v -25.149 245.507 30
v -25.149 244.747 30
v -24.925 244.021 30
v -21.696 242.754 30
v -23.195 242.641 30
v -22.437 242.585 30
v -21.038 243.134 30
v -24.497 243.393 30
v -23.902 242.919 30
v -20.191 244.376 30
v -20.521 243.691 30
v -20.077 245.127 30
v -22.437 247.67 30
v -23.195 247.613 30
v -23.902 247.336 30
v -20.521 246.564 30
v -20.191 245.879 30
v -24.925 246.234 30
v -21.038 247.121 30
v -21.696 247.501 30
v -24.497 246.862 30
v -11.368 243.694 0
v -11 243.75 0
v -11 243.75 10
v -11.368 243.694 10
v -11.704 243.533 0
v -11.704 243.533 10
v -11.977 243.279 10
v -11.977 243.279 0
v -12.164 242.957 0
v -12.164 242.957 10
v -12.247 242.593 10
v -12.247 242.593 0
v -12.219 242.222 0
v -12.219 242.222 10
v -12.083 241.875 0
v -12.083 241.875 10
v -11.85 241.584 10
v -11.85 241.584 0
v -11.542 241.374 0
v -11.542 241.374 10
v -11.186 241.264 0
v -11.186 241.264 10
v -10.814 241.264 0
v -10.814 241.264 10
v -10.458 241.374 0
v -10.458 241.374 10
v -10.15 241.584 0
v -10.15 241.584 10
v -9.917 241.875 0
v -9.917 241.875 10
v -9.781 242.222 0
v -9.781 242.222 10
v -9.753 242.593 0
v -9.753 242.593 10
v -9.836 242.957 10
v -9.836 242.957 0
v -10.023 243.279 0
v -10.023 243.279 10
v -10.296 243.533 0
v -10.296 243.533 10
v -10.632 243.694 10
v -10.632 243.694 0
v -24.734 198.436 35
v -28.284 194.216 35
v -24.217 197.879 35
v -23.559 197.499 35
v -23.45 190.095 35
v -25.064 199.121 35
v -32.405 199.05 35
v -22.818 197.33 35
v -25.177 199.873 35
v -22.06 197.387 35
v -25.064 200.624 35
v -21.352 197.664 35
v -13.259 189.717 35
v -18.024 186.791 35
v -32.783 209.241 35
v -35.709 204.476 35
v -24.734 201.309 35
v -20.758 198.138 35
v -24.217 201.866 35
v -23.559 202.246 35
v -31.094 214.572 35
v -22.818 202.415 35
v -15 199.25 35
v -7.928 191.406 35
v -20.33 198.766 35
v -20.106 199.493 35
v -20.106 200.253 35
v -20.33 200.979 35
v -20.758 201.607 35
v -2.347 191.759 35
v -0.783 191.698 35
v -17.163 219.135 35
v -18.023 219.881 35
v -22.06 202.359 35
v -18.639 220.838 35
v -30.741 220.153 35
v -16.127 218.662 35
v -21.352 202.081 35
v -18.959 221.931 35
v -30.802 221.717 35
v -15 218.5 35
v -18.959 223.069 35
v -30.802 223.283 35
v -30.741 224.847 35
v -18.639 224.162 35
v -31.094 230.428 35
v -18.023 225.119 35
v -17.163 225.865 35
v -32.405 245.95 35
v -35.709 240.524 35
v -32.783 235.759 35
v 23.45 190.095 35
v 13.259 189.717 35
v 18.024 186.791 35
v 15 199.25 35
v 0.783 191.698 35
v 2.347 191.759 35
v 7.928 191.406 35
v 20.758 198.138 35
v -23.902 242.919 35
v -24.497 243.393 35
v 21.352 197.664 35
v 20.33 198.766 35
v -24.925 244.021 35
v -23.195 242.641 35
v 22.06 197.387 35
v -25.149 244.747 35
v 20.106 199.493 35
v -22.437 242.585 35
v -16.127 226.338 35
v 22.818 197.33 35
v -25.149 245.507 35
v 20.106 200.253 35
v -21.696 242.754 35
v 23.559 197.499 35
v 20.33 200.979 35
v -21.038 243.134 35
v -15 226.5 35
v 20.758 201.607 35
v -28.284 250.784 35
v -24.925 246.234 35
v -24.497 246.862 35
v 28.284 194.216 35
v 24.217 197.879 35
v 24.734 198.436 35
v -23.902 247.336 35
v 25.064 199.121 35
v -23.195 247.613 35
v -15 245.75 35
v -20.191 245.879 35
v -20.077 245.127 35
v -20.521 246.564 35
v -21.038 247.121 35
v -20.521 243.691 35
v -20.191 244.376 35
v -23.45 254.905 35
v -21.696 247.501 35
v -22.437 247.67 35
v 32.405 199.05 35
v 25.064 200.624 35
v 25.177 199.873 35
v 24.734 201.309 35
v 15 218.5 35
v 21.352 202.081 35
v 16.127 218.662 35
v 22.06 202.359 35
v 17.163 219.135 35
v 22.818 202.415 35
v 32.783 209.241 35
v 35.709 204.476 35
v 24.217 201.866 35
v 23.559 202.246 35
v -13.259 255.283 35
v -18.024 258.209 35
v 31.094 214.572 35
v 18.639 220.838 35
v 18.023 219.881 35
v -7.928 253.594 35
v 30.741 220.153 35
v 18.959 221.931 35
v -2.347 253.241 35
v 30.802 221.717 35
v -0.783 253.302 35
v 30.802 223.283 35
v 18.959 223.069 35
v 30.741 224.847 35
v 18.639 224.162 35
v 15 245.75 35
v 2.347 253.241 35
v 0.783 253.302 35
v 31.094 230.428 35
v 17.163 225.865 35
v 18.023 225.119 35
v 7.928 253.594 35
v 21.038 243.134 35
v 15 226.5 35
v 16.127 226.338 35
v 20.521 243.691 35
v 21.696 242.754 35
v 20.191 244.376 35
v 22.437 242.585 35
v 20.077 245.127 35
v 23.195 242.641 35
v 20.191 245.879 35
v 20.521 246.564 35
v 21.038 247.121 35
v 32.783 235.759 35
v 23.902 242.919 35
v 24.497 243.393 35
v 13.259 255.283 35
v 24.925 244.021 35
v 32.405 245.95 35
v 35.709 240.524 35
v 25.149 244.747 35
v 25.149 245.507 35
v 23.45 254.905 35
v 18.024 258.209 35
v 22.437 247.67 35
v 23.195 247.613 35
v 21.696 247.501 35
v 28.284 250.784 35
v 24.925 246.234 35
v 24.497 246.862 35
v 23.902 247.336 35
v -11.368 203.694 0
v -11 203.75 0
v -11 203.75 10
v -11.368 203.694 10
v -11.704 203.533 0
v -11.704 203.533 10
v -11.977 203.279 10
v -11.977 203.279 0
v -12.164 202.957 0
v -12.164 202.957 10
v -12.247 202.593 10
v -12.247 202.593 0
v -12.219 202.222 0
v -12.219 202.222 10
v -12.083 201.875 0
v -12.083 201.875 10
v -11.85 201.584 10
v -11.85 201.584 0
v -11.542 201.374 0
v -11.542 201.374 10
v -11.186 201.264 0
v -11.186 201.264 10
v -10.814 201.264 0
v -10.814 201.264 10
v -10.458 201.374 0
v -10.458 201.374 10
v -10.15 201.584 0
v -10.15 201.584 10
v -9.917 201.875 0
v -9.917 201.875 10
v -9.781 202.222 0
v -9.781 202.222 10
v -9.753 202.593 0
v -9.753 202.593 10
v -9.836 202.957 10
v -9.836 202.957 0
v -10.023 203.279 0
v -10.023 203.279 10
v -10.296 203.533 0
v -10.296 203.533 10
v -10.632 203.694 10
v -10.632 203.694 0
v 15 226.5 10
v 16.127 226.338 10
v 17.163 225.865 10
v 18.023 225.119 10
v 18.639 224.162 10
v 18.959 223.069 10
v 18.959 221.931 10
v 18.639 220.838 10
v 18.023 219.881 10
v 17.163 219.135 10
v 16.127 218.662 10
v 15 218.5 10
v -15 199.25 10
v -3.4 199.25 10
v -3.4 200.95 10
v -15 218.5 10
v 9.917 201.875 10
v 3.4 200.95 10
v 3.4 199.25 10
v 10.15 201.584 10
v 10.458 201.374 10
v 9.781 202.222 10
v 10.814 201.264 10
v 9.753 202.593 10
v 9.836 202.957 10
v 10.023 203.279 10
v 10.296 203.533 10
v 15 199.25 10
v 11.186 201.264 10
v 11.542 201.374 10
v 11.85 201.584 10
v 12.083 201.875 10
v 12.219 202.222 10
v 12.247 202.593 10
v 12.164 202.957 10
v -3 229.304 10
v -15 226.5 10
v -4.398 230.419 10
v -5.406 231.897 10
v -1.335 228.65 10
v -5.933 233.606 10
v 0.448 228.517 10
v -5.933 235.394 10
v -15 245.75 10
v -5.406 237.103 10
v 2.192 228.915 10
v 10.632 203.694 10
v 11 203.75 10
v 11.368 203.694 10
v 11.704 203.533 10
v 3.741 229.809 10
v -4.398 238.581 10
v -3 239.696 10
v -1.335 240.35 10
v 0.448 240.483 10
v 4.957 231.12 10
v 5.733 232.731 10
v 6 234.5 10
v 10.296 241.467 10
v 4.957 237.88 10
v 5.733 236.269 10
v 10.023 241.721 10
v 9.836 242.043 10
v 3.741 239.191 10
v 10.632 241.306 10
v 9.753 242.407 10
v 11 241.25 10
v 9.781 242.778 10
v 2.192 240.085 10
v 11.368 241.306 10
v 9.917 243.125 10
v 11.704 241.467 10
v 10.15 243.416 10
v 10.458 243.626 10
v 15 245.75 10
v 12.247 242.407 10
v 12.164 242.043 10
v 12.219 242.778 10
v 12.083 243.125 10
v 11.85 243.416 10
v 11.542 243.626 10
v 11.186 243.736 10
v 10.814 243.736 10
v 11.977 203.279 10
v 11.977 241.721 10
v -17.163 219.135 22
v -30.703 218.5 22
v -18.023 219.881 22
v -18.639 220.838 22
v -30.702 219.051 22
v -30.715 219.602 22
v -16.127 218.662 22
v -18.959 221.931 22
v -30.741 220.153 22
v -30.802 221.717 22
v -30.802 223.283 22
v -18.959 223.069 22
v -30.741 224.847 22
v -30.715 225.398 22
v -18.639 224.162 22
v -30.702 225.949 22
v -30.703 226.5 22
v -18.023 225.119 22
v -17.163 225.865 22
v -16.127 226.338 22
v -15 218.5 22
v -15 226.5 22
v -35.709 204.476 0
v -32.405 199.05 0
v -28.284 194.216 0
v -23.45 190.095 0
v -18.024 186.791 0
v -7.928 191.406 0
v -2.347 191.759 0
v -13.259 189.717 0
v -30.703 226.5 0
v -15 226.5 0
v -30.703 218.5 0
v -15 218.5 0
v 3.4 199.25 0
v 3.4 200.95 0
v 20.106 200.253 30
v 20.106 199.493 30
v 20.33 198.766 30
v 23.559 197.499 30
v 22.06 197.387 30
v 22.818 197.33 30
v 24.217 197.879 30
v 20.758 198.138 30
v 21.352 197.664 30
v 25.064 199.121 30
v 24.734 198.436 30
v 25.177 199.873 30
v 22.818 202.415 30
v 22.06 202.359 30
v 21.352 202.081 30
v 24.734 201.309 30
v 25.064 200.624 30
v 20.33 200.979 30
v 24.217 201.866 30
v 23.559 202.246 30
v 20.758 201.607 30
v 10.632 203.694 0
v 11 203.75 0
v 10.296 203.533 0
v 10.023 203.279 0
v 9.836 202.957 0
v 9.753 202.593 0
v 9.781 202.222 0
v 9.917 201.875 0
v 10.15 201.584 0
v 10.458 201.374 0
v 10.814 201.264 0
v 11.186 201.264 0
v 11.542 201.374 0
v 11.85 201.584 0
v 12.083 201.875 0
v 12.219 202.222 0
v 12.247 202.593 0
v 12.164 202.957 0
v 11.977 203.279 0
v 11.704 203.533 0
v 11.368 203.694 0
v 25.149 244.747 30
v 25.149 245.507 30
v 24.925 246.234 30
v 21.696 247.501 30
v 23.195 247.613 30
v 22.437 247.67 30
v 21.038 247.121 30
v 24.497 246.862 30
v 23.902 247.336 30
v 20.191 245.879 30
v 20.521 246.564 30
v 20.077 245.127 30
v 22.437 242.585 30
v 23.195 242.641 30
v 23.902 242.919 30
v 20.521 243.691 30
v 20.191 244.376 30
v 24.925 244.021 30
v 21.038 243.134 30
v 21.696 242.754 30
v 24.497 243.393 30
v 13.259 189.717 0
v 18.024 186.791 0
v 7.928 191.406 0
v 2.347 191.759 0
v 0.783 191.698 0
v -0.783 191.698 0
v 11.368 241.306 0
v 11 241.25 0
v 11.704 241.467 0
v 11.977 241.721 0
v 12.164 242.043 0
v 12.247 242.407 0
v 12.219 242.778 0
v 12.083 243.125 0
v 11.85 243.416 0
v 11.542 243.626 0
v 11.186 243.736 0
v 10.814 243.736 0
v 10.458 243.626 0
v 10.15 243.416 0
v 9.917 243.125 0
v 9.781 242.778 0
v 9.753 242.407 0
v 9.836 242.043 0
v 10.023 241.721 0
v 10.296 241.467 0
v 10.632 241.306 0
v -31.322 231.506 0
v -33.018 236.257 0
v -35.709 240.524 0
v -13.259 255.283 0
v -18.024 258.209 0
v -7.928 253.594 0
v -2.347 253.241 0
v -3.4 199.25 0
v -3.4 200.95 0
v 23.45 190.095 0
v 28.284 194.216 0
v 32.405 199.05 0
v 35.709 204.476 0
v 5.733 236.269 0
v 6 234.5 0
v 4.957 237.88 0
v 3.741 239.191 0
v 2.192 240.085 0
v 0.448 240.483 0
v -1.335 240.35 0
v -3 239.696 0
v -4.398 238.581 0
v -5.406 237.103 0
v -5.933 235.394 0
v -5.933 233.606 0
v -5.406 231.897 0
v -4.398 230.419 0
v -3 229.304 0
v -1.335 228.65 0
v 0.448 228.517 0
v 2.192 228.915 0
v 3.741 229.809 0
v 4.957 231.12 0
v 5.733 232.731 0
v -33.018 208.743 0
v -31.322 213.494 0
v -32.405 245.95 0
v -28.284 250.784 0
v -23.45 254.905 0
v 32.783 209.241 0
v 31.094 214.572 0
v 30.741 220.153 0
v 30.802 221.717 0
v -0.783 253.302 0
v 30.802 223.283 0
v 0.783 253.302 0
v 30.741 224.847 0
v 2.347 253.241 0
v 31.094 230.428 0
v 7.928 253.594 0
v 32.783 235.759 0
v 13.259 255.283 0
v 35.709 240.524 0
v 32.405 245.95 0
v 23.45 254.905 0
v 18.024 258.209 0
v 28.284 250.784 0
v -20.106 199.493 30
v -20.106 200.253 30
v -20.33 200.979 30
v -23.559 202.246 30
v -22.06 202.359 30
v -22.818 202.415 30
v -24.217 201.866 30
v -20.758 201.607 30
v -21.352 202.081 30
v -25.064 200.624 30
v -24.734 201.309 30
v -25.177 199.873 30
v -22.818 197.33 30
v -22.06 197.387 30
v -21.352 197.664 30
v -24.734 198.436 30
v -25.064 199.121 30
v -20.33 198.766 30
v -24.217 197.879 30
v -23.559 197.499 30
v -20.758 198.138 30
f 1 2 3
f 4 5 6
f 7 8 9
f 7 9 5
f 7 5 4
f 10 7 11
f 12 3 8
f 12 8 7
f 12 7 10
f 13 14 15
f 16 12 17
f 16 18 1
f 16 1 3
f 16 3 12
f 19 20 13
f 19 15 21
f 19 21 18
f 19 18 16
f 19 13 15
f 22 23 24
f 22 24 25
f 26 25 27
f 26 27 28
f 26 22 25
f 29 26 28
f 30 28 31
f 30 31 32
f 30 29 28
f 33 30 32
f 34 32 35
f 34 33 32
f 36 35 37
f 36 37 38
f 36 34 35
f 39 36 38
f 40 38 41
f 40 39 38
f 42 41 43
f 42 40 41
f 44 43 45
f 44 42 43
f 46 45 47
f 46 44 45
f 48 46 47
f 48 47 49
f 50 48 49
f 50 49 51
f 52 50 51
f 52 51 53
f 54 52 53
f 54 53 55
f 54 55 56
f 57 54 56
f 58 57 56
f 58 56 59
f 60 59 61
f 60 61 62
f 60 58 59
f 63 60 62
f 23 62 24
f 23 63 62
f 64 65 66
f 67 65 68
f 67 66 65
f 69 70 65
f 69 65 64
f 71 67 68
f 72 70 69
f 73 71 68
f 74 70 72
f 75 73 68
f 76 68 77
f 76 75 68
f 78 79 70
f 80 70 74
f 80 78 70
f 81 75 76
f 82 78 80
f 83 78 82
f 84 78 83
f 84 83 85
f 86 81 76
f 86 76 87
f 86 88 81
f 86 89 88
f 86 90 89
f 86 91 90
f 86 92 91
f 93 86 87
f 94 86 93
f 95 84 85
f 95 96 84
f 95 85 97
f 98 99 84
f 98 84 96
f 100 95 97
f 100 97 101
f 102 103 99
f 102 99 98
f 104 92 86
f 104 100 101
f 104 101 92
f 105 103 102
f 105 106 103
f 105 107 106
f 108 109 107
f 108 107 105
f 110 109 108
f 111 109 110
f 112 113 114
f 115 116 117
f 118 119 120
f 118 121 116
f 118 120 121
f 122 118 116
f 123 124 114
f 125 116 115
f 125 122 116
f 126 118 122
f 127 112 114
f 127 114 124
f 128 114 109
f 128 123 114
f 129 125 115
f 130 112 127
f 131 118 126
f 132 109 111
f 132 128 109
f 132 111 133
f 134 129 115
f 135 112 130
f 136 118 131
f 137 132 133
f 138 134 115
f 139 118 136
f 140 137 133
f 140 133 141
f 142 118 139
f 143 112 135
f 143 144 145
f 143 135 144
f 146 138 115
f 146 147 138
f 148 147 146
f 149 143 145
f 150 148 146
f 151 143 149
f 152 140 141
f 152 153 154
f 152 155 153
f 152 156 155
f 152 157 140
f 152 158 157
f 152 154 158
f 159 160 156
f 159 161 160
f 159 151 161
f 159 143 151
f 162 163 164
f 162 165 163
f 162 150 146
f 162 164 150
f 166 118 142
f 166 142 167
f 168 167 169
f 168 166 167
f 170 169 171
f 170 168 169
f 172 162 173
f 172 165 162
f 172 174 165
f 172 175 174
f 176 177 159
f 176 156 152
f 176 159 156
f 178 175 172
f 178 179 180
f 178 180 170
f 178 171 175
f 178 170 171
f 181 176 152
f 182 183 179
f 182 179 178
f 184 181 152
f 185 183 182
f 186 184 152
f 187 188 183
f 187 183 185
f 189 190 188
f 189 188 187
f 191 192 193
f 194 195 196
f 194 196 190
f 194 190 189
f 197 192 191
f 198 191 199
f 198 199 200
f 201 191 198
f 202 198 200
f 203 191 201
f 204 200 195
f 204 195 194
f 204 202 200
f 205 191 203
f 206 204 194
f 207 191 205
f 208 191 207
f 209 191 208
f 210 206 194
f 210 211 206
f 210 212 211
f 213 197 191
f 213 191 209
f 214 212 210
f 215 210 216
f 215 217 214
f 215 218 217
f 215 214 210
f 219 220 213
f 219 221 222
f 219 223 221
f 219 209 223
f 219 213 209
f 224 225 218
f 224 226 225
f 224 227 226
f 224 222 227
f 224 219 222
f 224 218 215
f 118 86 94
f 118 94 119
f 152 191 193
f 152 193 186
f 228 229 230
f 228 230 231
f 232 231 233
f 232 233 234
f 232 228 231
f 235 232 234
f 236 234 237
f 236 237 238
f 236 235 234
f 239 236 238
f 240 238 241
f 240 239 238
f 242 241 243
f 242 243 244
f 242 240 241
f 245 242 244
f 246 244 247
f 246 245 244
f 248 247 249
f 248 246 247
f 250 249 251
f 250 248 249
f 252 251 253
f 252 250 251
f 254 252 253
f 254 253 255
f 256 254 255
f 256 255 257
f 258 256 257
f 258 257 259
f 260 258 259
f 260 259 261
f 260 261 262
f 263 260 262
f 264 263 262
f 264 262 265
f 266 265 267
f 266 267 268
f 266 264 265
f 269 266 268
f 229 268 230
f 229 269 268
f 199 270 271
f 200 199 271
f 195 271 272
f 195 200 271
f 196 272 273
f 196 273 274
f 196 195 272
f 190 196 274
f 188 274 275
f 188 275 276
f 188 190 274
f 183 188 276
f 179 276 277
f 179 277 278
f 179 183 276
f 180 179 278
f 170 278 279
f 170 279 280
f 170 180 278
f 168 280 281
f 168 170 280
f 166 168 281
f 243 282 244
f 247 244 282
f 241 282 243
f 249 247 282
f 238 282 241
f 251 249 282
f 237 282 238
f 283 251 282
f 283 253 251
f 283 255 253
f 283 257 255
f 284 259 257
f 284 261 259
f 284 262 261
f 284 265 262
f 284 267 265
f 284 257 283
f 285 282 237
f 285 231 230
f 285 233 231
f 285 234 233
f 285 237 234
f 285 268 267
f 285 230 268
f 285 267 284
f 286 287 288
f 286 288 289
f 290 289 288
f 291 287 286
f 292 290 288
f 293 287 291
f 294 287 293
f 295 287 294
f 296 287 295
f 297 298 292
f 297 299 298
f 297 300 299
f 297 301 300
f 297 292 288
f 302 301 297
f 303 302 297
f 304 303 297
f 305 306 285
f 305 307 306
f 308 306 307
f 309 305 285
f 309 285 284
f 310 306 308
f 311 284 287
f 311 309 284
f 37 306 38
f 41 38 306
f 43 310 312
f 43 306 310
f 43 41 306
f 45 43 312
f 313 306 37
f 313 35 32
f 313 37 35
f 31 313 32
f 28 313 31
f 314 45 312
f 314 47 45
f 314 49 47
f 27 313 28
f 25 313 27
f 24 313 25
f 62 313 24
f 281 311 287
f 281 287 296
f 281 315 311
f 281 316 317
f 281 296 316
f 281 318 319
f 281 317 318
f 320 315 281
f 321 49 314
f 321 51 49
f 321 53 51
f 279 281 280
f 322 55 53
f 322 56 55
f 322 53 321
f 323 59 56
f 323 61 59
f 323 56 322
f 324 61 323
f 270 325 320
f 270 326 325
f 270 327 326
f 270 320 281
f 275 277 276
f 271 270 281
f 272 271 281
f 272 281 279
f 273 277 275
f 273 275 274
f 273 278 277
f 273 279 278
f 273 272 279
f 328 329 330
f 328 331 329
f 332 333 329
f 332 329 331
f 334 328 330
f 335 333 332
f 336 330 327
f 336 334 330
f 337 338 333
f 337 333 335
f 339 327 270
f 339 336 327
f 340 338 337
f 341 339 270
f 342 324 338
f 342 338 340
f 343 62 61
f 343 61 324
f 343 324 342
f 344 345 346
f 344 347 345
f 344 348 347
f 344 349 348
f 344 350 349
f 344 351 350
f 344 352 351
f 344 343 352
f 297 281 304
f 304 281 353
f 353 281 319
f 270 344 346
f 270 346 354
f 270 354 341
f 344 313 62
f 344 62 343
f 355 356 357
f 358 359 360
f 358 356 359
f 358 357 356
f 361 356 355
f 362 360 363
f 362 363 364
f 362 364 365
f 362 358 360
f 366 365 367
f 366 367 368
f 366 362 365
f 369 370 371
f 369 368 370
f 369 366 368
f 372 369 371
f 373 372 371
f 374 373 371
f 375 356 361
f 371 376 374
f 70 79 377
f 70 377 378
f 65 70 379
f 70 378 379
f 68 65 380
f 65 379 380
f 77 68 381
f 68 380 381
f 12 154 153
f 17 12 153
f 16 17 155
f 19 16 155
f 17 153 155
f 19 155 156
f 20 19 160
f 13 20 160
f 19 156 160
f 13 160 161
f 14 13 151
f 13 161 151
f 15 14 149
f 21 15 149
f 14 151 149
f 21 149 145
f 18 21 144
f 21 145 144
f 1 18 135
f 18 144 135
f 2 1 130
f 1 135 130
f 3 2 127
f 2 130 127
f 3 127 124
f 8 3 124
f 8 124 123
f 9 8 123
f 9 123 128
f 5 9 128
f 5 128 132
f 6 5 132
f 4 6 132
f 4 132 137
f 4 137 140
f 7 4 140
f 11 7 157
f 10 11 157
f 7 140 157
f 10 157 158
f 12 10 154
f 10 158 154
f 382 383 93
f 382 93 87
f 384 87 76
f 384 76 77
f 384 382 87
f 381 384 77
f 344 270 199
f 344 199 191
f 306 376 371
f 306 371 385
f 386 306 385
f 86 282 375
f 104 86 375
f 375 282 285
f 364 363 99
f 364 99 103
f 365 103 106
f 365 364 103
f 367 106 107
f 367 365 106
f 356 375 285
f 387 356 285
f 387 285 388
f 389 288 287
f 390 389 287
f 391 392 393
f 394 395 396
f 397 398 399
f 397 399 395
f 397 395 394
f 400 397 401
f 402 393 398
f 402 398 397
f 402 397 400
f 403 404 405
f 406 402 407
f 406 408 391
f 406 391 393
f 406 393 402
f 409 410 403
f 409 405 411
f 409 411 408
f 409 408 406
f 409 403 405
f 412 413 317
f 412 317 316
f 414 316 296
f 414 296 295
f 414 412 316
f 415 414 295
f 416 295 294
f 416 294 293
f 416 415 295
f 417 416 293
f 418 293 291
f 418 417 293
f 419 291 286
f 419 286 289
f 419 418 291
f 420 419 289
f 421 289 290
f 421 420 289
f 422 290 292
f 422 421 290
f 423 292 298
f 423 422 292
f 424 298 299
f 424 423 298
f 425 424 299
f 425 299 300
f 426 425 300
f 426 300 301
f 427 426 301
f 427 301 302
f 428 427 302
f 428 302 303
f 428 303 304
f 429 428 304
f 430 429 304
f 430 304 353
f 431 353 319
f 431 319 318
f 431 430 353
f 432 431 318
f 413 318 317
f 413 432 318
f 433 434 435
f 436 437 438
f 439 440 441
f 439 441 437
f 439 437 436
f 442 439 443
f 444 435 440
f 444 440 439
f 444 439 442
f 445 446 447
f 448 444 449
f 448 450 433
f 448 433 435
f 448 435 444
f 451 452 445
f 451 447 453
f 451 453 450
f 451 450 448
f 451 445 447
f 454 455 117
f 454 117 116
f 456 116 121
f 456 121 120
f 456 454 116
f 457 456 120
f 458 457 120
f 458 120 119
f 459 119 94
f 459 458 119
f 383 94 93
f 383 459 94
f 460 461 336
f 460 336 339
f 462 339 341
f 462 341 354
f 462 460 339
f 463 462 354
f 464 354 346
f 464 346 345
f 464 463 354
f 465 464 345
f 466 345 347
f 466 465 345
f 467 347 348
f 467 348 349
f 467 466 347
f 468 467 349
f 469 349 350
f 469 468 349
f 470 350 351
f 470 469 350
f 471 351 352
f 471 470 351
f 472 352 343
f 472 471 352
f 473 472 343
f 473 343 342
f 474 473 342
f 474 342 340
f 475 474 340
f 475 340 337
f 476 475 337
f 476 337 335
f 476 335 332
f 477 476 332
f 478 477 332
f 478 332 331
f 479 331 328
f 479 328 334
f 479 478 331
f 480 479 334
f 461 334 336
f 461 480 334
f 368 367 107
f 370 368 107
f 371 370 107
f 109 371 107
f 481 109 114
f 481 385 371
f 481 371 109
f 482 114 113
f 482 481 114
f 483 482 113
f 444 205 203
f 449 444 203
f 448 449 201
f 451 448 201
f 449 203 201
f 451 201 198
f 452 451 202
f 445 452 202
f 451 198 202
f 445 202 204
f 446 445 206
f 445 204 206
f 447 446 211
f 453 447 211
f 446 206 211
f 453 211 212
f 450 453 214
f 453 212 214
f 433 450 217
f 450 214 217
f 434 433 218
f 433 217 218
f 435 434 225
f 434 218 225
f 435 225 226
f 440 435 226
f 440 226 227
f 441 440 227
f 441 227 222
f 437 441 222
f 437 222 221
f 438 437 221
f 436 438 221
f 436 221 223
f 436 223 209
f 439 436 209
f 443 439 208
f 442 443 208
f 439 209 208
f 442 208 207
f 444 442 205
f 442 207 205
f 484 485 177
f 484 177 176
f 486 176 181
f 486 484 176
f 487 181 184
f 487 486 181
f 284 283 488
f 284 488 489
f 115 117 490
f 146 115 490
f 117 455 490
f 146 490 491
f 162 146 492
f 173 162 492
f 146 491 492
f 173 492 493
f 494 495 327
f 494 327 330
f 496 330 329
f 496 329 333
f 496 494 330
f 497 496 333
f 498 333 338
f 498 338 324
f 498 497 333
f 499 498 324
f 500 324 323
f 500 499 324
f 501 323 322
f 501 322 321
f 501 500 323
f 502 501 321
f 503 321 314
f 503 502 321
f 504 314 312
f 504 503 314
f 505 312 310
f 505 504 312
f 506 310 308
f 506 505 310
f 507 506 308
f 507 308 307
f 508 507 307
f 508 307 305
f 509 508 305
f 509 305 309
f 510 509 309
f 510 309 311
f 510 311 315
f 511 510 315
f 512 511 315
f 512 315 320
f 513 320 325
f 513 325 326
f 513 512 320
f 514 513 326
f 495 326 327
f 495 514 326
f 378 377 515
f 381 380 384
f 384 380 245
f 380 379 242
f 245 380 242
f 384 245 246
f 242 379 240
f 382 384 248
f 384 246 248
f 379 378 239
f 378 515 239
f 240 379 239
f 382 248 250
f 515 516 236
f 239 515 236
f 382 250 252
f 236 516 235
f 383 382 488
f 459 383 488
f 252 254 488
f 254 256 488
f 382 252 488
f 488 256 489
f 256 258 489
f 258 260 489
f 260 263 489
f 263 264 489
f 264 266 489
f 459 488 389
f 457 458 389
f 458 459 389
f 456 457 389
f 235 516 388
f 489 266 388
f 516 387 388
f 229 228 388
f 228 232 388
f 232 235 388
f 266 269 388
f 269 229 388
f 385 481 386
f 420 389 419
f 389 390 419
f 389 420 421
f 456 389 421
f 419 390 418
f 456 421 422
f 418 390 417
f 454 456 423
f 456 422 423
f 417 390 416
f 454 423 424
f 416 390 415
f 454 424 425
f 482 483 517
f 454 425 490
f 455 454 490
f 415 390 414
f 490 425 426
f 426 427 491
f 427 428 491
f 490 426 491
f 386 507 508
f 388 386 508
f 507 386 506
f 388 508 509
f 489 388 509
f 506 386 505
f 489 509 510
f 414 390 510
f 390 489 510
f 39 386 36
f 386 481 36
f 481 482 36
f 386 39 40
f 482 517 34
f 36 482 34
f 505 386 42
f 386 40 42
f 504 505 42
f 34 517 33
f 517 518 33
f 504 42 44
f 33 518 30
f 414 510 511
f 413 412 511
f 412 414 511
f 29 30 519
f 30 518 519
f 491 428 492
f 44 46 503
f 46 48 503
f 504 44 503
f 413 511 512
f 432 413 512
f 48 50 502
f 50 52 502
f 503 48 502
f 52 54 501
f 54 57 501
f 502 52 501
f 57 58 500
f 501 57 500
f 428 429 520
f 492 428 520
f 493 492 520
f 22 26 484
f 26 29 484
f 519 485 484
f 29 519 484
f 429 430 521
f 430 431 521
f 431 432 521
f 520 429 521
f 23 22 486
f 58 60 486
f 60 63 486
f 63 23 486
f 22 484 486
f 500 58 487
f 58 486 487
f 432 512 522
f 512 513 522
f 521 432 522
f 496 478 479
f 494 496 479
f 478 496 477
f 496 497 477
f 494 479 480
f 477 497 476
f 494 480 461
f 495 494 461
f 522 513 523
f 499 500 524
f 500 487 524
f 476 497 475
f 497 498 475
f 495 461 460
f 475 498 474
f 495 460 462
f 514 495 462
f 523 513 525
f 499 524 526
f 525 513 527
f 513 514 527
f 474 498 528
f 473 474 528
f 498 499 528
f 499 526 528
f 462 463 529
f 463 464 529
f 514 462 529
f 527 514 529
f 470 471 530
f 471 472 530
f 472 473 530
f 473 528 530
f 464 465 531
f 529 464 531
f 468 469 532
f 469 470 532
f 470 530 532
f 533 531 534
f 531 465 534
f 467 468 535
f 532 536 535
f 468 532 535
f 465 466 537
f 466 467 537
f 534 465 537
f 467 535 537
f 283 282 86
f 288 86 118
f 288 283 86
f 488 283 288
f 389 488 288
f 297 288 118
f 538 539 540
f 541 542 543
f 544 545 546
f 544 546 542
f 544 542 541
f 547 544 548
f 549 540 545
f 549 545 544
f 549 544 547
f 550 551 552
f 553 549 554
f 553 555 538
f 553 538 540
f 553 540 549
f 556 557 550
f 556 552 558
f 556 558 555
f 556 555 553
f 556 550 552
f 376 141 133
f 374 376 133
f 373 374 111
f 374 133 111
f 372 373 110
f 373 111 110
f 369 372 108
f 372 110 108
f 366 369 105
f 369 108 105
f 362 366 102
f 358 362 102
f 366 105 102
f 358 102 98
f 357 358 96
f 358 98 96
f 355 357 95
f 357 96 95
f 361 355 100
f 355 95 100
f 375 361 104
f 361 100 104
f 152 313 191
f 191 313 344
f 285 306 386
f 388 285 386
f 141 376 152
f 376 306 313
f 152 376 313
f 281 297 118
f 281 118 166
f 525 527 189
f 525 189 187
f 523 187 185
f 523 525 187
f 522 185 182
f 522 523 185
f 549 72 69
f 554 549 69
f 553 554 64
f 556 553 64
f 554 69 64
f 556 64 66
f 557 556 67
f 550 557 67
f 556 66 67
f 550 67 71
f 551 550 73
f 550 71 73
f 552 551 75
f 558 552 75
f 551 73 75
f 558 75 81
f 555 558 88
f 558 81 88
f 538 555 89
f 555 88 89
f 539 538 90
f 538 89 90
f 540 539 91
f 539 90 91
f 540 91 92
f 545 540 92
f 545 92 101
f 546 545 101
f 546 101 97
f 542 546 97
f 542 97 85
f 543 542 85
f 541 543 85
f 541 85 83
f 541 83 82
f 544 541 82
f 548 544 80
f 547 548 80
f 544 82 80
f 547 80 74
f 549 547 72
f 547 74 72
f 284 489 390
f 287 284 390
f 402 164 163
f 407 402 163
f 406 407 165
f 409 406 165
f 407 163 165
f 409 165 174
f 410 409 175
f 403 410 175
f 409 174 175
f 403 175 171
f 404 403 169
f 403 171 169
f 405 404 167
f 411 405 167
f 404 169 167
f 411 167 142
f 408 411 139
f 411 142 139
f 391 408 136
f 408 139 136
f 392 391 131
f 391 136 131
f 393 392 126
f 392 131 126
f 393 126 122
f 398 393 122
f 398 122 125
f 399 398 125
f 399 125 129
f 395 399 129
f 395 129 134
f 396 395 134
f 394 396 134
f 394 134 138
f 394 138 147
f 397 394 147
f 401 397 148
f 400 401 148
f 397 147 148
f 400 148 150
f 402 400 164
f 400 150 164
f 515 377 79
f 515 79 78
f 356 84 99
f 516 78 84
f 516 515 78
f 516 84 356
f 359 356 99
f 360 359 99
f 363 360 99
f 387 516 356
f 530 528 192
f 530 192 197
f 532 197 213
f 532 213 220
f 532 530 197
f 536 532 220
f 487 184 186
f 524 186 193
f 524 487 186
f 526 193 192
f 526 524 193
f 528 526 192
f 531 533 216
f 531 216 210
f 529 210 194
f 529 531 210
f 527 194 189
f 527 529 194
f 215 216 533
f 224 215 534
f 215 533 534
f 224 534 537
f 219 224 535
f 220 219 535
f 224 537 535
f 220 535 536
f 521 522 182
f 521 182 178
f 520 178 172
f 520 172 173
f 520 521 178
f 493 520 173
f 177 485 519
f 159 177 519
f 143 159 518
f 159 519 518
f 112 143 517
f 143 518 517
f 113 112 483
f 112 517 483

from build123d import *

# Parameters (mm, degrees)
SKETCH1_R           = 40
SKETCH1_R_2         = 6
SKETCH1_W           = 6.8
SKETCH1_H           = 1.7
BOSS_EXTRUDE1_DEPTH = 10
SKETCH3_R           = 40
SKETCH3_W           = 30
SKETCH3_H           = 46.499999994
BOSS_EXTRUDE3_DEPTH = 25
CUT_EXTRUDE1_START  = -35
CUT_EXTRUDE1_DEPTH  = 35
SKETCH5_R           = 2.55
CUT_EXTRUDE2_DEPTH  = 5
CUT_EXTRUDE3_DEPTH  = 25
SKETCH8_W           = 22
SKETCH8_H           = 8
CUT_EXTRUDE4_DEPTH  = 22


with BuildPart() as part:
    # Sketch1 → Boss-Extrude1 (new body)
    with BuildSketch(Plane.XY):
        with Locations((0, 222.499999997)):
            Circle(SKETCH1_R)
        with Locations((0, 234.5)):
            Circle(SKETCH1_R_2, mode=Mode.SUBTRACT)
        with Locations((0, 200.1)):
            Rectangle(SKETCH1_W, SKETCH1_H, mode=Mode.SUBTRACT)
        with BuildLine():
            ThreePointArc((11, 243.75), (9.75, 242.5), (11, 241.25))
            ThreePointArc((11, 241.25), (12.25, 242.5), (11, 243.75))
        make_face(mode=Mode.SUBTRACT)
        with BuildLine():
            ThreePointArc((-11, 241.25), (-9.75, 242.5), (-11, 243.75))
            ThreePointArc((-11, 243.75), (-12.25, 242.5), (-11, 241.25))
        make_face(mode=Mode.SUBTRACT)
        with BuildLine():
            ThreePointArc((11, 201.25), (12.25, 202.5), (11, 203.75))
            ThreePointArc((11, 203.75), (9.75, 202.5), (11, 201.25))
        make_face(mode=Mode.SUBTRACT)
        with BuildLine():
            ThreePointArc((-11, 201.25), (-9.75, 202.5), (-11, 203.75))
            ThreePointArc((-11, 203.75), (-12.25, 202.5), (-11, 201.25))
        make_face(mode=Mode.SUBTRACT)
    extrude(amount=BOSS_EXTRUDE1_DEPTH)

    # Sketch3 → Boss-Extrude3 (add)
    with BuildSketch(Plane.XY.offset(10)):
        with Locations((0, 222.499999997)):
            Circle(SKETCH3_R)
        with Locations((0, 222.499999997)):
            Rectangle(SKETCH3_W, SKETCH3_H, mode=Mode.SUBTRACT)
    extrude(amount=BOSS_EXTRUDE3_DEPTH)

    # Sketch4 → Cut-Extrude1 (cut)
    with BuildSketch(Plane.XY.offset(35).offset(CUT_EXTRUDE1_START)):
        with BuildLine():
            ThreePointArc((40, 222.499999997), (38.912456167, 231.763949212), (35.708962247, 240.524150885))
            ThreePointArc((35.708962247, 240.524150885), (31.77566454, 233.14486234), (30.74061322, 224.84706751))
            ThreePointArc((30.74061322, 224.84706751), (30.809531665, 222.499999997), (30.74061322, 220.152932484))
            ThreePointArc((30.74061322, 220.152932484), (31.77566454, 211.855137653), (35.708962247, 204.475849108))
            ThreePointArc((35.708962247, 204.475849108), (38.912456167, 213.236050782), (40, 222.499999997))
        make_face()
        with BuildLine():
            ThreePointArc((-2.347067513, 191.759386777), (-10.644862344, 190.724335457), (-18.024150889, 186.79103775))
            ThreePointArc((-18.024150889, 186.79103775), (0, 182.499999997), (18.024150889, 186.79103775))
            ThreePointArc((18.024150889, 186.79103775), (10.644862344, 190.724335457), (2.347067513, 191.759386777))
            ThreePointArc((2.347067513, 191.759386777), (0, 191.690468331), (-2.347067513, 191.759386777))
        make_face()
        with BuildLine():
            ThreePointArc((18.024150889, 258.208962244), (0, 262.499999997), (-18.024150889, 258.208962244))
            ThreePointArc((-18.024150889, 258.208962244), (-10.644862344, 254.275664537), (-2.347067513, 253.240613217))
            ThreePointArc((-2.347067513, 253.240613217), (0, 253.309531662), (2.347067513, 253.240613217))
            ThreePointArc((2.347067513, 253.240613217), (10.644862344, 254.275664537), (18.024150889, 258.208962244))
        make_face()
        with BuildLine():
            ThreePointArc((-30.74061322, 220.152932484), (-30.809531665, 222.499999997), (-30.74061322, 224.84706751))
            ThreePointArc((-30.74061322, 224.84706751), (-31.77566454, 233.14486234), (-35.708962247, 240.524150885))
            ThreePointArc((-35.708962247, 240.524150885), (-40, 222.499999997), (-35.708962247, 204.475849108))
            ThreePointArc((-35.708962247, 204.475849108), (-31.77566454, 211.855137653), (-30.74061322, 220.152932484))
        make_face()
    extrude(amount=CUT_EXTRUDE1_DEPTH, mode=Mode.SUBTRACT)

    # Sketch5 → Cut-Extrude2 (cut)
    with BuildSketch(Plane.XY.offset(35)):
        with Locations((-22.627416998, 245.127416995)):
            Circle(SKETCH5_R)
        with Locations(Location((22.627416998, 245.127416995, 0), (0, 0, 180))):
            Circle(SKETCH5_R)
        with Locations((22.627416998, 199.872582999)):
            Circle(SKETCH5_R)
        with Locations(Location((-22.627416998, 199.872582999, 0), (0, 0, 180))):
            Circle(SKETCH5_R)
    extrude(amount=-CUT_EXTRUDE2_DEPTH, mode=Mode.SUBTRACT)

    # Sketch6 → Cut-Extrude3 (cut)
    with BuildSketch(Plane.XY.offset(35)):
        with BuildLine():
            Line((-15, 218.499999997), (-15, 226.499999997))
            ThreePointArc((-15, 226.499999997), (-19, 222.499999997), (-15, 218.499999997))
        make_face()
        with BuildLine():
            Line((15, 218.499999997), (15, 226.499999997))
            ThreePointArc((15, 226.499999997), (19, 222.499999997), (15, 218.499999997))
        make_face()
    extrude(amount=-CUT_EXTRUDE3_DEPTH, mode=Mode.SUBTRACT)

    # Sketch8 → Cut-Extrude4 (cut)
    with BuildSketch(Plane(origin=(-15, 0, 0), x_dir=(0, 0, -1), z_dir=(1, 0, 0))):
        with Locations((-11, 222.499999997)):
            Rectangle(SKETCH8_W, SKETCH8_H)
    extrude(amount=-CUT_EXTRUDE4_DEPTH, mode=Mode.SUBTRACT)


solid = part.part
